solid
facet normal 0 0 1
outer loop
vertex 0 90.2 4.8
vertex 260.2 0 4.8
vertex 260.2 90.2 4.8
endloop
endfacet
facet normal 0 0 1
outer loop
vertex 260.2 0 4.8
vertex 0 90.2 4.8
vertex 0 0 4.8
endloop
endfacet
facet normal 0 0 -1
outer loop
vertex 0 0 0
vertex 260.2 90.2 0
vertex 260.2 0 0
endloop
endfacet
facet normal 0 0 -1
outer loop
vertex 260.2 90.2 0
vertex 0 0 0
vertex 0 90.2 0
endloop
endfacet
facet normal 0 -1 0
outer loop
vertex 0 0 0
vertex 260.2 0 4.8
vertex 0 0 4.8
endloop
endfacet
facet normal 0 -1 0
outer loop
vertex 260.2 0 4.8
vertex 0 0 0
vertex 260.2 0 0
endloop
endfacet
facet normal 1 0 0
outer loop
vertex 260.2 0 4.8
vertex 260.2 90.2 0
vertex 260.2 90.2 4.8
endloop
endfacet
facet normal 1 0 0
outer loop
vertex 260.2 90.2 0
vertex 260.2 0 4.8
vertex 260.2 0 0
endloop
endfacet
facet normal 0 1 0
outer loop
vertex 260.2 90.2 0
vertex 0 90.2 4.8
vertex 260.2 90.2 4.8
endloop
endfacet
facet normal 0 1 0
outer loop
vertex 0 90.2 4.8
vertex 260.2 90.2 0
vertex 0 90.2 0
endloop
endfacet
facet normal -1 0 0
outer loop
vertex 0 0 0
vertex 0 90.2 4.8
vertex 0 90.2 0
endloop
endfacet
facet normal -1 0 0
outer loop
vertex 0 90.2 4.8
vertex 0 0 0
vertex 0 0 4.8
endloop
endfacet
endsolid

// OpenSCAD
// file: ../configurations/global.scad
lampshade_piece_lampshade_diameter = 60;
lampshade_piece_lampshade_height = 70;
lampshade_piece_walled_width = 1;
lampshade_piece_border_diameter = 64;
lampshade_piece_border_height = 2;


lampshade_holder_piece_holder_external_diameter = 75;
lampshade_holder_piece_lampshade_diameter = 61;
lampshade_holder_piece_lampshade_border_diameter = 65;
lampshade_holder_piece_lampshade_border_height = 2.1;
lampshade_holder_piece_holder_height = 4;
lampshade_holder_piece_bolt_throws_count = 4;
lampshade_holder_piece_bolt_throws_diameter = 3.5;
lampshade_holder_piece_bolt_throws_z = 4;

case_external_panes_thickness = 4.8;

external_size = [265, 95, 60];
// main file
include <../configurations/global.scad>


module bottomPanePiece(
    x_size = external_size.x - case_external_panes_thickness,
    y_size = external_size.y - case_external_panes_thickness,
    z_size = case_external_panes_thickness
) {
    cube([x_size, y_size, z_size]);
}


bottomPanePiece();
